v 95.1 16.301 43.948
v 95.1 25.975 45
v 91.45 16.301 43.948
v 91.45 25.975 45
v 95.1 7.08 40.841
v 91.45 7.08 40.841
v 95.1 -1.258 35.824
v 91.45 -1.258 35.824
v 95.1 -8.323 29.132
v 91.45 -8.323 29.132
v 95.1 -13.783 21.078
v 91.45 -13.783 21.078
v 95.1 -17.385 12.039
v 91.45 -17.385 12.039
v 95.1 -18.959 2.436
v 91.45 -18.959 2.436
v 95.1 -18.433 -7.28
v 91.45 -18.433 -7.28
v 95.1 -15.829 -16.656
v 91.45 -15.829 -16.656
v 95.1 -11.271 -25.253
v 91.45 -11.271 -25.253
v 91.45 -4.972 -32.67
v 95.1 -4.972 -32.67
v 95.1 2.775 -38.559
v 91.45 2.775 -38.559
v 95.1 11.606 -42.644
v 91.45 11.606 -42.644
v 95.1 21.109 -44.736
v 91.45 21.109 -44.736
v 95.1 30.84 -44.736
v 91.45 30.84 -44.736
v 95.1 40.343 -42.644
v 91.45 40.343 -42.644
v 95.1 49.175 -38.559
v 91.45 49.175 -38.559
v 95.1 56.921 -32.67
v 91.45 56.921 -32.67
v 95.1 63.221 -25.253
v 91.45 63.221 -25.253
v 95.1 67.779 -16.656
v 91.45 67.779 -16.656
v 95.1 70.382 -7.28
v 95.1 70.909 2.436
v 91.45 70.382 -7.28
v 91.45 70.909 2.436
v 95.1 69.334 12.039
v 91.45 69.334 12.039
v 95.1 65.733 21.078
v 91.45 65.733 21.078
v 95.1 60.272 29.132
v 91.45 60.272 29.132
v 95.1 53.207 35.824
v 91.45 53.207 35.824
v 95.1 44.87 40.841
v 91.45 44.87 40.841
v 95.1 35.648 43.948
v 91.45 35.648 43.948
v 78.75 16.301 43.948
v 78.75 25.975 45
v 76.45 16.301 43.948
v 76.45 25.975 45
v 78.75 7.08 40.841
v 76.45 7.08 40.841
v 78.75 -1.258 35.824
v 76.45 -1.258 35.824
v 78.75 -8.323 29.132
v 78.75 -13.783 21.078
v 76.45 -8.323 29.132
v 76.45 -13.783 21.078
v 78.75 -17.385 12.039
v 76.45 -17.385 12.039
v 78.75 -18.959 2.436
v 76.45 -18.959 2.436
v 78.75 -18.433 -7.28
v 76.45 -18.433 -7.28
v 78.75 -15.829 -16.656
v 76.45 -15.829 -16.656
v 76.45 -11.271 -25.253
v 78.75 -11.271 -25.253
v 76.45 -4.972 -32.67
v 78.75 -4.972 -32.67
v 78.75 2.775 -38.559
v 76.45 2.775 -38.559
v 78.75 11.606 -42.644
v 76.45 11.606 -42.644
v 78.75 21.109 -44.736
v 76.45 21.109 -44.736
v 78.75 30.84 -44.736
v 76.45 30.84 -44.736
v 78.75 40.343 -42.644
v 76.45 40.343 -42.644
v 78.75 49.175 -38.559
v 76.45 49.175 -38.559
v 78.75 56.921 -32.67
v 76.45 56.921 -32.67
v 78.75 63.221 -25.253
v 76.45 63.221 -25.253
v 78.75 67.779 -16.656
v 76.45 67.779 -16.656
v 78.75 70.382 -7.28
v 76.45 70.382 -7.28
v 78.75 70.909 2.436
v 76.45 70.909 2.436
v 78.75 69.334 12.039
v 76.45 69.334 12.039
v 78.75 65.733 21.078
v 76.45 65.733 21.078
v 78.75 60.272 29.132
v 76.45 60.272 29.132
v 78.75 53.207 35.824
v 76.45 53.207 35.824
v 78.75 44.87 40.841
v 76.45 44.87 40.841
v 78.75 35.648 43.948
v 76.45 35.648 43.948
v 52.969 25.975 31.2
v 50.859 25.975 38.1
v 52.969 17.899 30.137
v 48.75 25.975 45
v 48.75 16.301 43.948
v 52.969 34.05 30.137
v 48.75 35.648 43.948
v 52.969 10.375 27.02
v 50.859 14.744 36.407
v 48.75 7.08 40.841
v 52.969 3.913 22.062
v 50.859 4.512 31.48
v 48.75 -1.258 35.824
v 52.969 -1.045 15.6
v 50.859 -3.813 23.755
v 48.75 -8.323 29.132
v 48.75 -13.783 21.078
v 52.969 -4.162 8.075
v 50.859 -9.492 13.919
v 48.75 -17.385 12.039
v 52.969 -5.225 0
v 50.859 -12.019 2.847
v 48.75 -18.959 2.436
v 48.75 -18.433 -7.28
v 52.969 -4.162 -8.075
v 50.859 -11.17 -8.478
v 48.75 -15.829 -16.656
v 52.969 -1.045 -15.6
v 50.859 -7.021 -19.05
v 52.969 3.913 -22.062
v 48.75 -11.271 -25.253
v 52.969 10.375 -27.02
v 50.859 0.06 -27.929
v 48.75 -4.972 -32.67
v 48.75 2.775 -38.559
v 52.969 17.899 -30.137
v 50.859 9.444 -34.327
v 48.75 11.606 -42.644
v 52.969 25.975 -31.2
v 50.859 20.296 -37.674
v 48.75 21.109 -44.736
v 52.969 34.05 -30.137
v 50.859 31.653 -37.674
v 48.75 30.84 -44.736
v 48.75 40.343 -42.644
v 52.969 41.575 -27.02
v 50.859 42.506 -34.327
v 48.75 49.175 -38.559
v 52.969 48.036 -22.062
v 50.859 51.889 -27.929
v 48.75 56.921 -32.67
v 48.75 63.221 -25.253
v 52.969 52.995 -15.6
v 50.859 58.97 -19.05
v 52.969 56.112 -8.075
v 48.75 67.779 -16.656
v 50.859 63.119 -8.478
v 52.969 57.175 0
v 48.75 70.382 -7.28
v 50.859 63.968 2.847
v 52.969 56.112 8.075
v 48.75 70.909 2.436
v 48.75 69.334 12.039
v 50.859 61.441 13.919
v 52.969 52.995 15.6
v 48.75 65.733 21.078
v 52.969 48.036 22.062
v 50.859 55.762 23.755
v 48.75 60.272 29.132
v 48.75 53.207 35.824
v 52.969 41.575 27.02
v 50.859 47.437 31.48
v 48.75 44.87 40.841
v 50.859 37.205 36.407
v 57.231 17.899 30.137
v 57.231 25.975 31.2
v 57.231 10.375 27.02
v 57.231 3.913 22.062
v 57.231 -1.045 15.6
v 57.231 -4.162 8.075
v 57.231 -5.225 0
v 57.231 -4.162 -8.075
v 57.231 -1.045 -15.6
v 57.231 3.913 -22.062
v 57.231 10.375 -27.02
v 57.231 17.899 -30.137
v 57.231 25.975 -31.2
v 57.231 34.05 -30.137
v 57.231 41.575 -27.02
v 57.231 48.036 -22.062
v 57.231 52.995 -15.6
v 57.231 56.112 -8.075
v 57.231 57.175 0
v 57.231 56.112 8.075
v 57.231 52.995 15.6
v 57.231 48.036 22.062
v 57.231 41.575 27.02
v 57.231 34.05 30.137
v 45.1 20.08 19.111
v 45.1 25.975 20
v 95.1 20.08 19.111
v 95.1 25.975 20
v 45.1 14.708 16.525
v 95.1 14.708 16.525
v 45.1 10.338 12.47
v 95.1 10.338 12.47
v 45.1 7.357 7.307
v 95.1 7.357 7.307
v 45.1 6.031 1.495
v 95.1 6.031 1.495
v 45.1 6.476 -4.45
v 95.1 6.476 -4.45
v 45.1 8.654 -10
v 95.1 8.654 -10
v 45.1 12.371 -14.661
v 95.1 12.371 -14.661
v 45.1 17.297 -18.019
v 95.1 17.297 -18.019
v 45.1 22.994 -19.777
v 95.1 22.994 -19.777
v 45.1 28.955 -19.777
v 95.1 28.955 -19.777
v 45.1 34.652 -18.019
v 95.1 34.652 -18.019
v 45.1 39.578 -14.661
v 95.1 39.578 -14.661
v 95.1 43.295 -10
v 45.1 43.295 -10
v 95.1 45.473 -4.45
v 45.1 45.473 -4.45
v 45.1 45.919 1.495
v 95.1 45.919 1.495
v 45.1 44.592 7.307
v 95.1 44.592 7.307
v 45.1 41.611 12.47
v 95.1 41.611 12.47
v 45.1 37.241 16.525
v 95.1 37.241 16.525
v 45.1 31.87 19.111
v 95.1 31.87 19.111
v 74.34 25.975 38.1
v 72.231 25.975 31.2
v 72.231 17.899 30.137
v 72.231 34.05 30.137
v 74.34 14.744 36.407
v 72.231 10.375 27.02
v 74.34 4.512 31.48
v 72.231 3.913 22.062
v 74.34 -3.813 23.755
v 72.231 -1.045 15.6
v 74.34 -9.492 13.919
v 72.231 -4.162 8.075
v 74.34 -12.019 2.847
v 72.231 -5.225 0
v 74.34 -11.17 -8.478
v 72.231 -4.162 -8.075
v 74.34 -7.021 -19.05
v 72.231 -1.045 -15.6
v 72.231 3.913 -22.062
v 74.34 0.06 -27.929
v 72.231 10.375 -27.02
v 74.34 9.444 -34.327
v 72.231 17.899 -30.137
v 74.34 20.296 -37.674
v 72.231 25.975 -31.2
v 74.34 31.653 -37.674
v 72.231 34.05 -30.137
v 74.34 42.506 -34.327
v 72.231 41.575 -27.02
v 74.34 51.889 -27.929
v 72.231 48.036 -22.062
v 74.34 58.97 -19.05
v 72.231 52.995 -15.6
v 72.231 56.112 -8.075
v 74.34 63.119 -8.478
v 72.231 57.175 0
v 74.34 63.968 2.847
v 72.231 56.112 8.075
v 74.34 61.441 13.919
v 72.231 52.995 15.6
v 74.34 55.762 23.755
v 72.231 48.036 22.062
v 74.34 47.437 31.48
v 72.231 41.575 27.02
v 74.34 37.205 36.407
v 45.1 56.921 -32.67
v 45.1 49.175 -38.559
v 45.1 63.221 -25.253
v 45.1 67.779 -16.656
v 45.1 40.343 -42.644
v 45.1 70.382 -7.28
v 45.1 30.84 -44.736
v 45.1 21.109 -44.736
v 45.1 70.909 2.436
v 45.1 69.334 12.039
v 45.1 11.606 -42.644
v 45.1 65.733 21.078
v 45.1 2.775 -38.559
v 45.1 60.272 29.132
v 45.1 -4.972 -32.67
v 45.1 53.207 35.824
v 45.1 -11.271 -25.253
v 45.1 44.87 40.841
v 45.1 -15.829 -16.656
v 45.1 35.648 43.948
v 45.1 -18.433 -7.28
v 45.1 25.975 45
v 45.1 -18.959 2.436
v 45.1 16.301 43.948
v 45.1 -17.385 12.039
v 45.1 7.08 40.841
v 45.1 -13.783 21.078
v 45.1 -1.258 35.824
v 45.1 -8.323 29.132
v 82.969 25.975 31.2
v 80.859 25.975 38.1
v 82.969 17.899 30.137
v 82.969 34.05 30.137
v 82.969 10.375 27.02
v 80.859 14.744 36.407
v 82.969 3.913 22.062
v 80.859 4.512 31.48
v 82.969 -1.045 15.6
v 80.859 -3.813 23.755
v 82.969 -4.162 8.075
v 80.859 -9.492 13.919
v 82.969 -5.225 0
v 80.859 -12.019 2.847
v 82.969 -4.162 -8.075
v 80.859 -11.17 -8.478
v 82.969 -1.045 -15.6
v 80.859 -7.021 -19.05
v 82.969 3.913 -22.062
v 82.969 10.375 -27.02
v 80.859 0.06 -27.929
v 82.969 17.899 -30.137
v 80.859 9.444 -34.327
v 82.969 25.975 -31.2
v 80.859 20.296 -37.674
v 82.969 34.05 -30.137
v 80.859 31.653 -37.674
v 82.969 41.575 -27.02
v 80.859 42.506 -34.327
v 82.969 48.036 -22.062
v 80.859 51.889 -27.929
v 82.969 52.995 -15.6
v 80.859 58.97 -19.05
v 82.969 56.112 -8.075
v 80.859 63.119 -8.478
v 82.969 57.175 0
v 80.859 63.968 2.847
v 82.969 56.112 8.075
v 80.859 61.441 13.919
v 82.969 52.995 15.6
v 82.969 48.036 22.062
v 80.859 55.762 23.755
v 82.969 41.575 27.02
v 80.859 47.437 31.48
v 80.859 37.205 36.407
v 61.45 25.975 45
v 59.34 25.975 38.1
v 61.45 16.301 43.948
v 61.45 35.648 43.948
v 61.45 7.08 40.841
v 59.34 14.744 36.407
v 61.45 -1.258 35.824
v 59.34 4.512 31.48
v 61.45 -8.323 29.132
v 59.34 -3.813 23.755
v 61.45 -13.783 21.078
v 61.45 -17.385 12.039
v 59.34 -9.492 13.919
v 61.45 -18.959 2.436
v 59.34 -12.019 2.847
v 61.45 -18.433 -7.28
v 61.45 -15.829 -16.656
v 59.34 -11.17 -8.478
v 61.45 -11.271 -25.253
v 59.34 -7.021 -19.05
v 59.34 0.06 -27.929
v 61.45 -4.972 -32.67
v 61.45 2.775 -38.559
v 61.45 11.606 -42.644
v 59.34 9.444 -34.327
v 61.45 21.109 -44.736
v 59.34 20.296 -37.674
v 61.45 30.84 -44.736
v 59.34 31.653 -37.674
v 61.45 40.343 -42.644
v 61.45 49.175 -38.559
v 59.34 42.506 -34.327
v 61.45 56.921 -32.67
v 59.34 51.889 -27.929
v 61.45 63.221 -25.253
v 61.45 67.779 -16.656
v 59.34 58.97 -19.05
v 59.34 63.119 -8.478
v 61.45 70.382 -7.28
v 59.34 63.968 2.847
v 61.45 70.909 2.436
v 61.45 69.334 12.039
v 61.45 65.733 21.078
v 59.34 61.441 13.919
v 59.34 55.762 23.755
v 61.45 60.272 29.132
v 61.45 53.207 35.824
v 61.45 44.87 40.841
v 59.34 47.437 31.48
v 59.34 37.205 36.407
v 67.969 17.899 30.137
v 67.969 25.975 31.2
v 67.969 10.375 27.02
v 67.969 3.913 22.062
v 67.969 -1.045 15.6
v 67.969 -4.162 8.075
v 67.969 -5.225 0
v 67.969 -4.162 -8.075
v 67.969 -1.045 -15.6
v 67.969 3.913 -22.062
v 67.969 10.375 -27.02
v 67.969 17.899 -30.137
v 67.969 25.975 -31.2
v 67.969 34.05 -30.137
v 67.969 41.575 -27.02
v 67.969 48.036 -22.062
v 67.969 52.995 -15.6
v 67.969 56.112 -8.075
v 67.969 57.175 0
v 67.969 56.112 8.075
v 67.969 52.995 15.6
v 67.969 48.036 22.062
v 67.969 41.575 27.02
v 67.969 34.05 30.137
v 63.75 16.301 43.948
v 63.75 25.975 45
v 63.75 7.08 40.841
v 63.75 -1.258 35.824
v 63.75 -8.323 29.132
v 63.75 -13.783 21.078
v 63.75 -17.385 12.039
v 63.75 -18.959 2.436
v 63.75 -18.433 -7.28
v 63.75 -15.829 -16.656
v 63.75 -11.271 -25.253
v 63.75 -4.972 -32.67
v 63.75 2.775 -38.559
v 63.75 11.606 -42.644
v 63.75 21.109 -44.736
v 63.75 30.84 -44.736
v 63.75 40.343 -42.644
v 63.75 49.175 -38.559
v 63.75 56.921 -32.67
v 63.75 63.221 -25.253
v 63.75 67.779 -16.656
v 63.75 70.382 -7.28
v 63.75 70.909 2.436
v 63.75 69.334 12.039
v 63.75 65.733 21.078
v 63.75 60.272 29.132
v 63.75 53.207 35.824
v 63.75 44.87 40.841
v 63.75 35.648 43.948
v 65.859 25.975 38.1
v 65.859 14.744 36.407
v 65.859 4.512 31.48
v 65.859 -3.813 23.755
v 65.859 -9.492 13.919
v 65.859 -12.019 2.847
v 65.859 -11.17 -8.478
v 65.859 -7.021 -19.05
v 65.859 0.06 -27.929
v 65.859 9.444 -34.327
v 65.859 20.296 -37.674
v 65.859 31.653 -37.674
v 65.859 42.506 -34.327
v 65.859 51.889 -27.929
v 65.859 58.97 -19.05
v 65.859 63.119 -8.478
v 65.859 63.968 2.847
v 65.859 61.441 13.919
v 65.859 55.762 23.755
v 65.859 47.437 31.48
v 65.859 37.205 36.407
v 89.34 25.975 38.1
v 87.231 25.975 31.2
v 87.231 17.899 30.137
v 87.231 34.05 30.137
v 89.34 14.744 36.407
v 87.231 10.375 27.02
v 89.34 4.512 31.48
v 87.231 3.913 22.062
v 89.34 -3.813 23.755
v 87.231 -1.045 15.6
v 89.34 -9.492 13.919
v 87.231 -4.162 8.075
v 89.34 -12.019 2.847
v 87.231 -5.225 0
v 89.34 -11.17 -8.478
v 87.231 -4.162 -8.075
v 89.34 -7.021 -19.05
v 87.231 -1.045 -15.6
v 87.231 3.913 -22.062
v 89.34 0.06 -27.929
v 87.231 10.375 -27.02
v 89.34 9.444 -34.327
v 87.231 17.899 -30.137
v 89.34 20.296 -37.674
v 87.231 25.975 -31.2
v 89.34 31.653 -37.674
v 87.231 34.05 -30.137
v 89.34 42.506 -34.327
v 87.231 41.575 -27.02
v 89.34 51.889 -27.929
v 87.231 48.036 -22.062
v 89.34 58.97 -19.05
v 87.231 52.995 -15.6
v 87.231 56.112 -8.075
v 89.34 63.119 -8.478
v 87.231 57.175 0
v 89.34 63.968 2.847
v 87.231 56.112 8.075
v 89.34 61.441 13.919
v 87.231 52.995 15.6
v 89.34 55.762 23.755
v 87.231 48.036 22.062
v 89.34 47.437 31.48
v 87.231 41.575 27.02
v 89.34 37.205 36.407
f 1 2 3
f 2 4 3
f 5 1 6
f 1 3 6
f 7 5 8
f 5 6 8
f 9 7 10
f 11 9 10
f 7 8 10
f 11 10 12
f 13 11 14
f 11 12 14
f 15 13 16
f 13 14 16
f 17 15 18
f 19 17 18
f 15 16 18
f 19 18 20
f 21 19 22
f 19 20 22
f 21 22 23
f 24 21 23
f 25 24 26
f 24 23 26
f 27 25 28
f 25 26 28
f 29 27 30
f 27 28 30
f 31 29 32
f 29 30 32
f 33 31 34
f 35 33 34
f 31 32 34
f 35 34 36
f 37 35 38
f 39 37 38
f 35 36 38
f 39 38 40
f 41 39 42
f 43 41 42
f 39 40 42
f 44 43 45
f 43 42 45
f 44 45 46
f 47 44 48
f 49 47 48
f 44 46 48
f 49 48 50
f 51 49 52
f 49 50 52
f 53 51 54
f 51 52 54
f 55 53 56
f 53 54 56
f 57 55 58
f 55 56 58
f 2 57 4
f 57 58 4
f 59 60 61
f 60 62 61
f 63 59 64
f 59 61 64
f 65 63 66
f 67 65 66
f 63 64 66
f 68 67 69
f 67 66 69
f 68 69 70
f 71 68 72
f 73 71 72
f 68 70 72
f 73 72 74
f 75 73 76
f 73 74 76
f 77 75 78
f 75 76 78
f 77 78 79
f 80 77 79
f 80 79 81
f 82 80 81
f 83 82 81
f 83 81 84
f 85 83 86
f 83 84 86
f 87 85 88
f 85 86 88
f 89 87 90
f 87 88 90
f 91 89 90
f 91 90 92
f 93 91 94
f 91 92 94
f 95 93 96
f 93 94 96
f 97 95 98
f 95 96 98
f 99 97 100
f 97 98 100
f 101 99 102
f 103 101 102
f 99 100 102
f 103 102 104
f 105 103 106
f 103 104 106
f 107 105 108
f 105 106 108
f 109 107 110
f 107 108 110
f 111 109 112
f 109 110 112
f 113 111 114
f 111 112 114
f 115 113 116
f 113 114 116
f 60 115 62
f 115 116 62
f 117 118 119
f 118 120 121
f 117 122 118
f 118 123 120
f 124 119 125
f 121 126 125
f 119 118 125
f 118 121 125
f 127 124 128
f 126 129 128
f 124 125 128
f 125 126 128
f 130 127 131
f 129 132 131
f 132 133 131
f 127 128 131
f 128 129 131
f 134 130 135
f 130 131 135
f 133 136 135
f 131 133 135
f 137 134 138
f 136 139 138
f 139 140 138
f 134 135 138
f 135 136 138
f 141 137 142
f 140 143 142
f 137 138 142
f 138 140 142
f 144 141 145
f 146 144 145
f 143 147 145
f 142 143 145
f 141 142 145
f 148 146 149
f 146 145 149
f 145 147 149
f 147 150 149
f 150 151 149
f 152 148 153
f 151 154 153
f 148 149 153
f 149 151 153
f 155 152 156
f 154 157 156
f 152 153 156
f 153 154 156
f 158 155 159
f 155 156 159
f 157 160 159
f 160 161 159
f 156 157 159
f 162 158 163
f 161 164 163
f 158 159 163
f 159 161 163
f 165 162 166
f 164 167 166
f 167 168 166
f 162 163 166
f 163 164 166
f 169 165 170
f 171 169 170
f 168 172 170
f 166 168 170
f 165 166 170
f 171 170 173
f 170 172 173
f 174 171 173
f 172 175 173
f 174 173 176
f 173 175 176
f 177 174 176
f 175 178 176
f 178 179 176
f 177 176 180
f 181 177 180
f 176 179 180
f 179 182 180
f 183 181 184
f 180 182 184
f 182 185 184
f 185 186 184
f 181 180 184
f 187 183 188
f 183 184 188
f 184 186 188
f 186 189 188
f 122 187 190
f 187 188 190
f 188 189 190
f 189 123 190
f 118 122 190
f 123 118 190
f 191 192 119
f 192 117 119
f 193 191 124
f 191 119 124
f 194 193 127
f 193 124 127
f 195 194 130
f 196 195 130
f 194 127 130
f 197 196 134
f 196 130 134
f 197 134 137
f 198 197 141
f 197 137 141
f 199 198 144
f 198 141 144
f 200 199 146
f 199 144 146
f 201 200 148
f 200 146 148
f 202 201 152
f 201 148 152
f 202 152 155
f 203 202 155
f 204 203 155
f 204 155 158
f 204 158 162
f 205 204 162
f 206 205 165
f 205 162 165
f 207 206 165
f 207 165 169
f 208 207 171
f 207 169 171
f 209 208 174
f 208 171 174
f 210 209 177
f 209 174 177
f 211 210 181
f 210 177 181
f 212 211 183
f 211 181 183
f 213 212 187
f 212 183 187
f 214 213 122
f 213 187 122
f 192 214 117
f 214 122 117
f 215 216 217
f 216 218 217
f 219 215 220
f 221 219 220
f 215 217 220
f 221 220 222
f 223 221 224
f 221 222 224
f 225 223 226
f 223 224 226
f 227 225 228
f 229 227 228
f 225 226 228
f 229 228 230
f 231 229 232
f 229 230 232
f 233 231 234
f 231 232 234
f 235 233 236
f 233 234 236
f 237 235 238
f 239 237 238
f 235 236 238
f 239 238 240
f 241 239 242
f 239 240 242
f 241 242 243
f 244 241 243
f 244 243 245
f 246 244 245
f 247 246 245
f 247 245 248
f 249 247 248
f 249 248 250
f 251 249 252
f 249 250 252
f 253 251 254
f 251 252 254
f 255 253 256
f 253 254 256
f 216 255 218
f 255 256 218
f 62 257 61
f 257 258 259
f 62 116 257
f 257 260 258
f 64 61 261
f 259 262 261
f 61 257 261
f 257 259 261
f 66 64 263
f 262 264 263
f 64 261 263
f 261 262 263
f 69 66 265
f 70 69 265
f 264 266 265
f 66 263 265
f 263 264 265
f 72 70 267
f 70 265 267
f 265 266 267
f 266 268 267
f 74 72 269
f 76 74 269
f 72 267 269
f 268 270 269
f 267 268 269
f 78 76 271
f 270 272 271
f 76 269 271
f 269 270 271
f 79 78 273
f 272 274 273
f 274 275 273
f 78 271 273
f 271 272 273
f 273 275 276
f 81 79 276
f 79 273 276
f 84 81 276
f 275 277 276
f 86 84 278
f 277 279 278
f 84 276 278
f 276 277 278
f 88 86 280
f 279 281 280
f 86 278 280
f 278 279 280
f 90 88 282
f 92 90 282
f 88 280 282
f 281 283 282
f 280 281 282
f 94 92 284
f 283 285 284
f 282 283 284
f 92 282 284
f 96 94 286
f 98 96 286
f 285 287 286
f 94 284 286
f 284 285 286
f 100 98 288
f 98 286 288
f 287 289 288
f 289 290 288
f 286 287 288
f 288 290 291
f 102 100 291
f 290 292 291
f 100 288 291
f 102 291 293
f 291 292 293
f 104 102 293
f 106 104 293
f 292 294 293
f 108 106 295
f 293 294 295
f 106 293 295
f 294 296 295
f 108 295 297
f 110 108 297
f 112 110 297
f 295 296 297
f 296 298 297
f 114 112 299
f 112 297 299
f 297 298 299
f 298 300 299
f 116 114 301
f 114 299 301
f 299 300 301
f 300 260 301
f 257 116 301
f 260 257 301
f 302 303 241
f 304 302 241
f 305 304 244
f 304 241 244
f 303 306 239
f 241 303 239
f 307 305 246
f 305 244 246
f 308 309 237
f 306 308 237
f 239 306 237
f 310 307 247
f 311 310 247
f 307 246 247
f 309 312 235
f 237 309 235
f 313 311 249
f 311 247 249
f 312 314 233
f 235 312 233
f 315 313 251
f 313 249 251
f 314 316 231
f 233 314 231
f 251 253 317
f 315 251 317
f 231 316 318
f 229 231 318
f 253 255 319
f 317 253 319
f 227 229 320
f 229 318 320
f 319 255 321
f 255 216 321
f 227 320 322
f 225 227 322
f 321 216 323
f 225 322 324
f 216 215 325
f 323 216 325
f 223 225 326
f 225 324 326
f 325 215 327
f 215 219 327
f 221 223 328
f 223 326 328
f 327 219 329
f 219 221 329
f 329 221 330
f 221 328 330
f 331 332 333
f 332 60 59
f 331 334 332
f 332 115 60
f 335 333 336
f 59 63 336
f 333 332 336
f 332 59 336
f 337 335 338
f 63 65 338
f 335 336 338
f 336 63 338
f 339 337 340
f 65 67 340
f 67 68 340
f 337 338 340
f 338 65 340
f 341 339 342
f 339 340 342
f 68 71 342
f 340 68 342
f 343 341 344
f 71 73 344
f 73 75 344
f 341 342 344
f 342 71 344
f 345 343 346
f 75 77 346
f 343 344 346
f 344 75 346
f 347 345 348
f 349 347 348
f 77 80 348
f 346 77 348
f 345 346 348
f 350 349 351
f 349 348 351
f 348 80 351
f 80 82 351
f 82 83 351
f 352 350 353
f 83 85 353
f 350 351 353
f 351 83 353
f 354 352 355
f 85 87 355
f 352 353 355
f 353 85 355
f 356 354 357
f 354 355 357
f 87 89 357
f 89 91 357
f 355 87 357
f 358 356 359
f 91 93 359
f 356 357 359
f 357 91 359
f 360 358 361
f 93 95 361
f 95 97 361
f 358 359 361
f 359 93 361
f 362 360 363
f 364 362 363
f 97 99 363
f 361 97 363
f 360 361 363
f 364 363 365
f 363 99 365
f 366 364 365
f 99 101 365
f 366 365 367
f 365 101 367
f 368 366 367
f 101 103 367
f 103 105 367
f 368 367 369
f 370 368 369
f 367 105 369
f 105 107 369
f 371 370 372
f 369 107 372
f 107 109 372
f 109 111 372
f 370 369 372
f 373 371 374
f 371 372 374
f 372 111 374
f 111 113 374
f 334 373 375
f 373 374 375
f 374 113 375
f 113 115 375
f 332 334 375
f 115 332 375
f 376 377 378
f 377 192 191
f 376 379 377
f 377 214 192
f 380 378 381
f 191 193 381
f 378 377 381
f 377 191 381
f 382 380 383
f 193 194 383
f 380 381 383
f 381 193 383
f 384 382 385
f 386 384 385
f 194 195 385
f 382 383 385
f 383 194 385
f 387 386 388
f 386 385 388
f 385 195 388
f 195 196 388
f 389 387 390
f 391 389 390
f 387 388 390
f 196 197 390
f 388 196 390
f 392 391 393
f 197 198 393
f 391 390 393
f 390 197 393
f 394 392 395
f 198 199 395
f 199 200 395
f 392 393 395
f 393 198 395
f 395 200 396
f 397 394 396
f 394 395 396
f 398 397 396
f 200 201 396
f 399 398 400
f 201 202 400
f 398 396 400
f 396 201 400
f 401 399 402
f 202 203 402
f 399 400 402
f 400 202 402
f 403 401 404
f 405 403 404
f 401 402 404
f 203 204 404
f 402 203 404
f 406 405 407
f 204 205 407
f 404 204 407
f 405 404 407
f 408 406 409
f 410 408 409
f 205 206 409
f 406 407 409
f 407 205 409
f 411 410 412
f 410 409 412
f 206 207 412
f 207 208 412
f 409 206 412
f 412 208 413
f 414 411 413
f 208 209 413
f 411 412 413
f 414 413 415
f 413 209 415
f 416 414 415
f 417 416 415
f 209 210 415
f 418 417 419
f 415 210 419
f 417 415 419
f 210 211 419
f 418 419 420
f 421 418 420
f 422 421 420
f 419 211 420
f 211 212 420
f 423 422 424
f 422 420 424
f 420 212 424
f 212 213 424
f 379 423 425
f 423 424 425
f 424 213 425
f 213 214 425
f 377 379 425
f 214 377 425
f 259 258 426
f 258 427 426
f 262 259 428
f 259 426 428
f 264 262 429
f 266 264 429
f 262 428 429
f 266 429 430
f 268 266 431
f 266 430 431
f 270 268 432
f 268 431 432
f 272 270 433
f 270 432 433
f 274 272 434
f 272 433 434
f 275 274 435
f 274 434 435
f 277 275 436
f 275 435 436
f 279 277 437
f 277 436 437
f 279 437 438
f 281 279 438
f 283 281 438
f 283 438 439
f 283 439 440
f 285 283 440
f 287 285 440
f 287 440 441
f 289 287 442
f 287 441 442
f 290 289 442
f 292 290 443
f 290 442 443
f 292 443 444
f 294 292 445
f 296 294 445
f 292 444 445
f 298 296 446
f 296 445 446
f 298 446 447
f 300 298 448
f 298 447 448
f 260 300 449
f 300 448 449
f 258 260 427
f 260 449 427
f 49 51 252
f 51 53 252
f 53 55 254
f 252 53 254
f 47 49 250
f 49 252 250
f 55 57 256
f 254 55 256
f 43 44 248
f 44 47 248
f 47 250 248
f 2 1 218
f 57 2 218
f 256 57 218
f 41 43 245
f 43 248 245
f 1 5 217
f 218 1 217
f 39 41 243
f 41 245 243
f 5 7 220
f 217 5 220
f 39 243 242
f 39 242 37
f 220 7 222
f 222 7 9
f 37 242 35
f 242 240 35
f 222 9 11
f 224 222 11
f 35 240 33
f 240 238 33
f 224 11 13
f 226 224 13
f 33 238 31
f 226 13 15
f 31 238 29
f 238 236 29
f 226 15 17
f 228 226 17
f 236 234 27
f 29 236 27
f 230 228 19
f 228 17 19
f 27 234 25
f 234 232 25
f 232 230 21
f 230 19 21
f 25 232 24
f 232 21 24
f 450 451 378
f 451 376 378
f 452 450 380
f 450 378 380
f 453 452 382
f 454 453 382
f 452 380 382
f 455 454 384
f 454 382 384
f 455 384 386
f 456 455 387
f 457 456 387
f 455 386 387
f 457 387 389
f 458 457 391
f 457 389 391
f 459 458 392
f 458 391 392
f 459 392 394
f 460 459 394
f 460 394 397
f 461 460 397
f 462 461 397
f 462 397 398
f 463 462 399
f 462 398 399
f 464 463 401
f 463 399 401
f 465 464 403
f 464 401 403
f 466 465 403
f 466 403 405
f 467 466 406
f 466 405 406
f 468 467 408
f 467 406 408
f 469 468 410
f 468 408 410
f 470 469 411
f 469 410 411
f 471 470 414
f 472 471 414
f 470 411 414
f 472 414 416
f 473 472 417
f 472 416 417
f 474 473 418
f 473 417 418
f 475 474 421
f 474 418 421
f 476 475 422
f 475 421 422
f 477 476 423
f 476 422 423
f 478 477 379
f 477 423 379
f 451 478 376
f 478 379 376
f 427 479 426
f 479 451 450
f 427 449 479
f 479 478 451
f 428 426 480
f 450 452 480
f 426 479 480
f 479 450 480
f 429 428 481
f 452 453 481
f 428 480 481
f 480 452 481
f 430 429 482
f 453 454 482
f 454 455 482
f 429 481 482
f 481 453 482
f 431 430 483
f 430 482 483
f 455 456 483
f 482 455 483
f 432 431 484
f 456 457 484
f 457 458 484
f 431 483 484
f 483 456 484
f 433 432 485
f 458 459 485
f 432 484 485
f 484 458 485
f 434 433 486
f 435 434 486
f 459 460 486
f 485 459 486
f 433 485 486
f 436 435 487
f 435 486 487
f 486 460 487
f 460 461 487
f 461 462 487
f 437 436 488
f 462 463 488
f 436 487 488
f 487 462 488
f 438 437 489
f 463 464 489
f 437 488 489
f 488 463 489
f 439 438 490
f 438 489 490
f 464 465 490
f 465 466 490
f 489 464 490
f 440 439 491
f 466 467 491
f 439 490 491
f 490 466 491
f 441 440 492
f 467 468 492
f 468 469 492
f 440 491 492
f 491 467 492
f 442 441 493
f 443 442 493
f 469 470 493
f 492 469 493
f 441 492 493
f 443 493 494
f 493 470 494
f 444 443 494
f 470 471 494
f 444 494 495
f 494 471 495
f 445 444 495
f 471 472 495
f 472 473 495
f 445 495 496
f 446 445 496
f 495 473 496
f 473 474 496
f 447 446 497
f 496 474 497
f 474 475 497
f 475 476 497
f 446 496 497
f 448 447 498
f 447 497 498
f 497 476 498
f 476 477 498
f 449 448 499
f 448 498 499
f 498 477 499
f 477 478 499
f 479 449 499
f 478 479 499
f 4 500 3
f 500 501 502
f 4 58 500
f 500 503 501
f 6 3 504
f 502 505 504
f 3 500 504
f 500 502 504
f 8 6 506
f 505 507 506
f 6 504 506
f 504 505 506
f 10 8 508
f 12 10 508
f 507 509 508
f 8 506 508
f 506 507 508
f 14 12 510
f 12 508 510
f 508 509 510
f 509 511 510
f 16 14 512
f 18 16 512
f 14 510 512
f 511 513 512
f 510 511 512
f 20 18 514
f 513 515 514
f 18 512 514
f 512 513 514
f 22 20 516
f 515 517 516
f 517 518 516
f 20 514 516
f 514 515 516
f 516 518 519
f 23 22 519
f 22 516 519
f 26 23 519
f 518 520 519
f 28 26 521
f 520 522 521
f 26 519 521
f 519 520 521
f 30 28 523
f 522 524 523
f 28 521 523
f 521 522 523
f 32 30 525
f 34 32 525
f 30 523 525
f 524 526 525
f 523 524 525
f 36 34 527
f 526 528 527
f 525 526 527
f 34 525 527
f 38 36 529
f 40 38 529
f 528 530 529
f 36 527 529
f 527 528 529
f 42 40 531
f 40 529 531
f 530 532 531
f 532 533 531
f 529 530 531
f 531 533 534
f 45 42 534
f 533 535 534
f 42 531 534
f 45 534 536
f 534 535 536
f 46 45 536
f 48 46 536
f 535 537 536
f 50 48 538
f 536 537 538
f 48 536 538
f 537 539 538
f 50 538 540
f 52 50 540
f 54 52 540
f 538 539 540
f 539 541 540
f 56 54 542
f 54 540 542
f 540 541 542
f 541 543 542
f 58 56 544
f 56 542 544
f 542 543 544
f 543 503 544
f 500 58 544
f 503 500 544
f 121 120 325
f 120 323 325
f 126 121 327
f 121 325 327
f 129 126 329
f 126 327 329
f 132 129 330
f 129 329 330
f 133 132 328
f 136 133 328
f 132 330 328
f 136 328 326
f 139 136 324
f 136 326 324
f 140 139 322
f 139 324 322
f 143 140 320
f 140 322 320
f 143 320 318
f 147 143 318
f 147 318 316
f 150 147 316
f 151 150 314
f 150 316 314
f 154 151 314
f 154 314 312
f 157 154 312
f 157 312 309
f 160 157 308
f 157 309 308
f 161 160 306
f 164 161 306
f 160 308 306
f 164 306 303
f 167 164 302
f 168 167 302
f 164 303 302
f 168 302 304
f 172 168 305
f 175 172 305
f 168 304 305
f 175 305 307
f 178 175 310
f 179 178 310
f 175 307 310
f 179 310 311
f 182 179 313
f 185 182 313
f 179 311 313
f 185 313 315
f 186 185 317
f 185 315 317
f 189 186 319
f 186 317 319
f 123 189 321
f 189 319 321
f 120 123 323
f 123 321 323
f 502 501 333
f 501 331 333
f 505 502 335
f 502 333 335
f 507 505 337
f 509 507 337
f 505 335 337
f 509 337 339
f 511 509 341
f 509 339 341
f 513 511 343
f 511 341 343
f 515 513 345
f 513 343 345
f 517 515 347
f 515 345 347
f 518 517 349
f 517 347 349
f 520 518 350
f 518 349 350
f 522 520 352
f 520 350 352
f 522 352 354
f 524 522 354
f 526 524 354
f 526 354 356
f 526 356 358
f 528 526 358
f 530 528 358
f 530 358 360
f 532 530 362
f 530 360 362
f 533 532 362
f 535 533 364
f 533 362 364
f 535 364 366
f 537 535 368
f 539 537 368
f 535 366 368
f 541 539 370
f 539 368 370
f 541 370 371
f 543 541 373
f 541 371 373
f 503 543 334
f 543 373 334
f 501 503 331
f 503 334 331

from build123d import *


with BuildPart() as part:
    # Skizze1 → Rotation2 (revolve)
    with BuildSketch(Plane.XY, mode=Mode.PRIVATE) as rotation2_sk:
        Polygon((45.099637471, 45.974649946), (95.099637471, 45.974649946), (95.099637471, 70.974649946), (91.449637471, 70.974649946), (87.230554067, 57.174649946), (82.968720876, 57.174649946), (78.749637471, 70.974649946), (76.449637471, 70.974649946), (72.230554067, 57.174649946), (70.099637471, 57.174649946), (67.968720876, 57.174649946), (63.749637471, 70.974649946), (61.449637471, 70.974649946), (57.230554067, 57.174649946), (52.968720876, 57.174649946), (48.749637471, 70.974649946), (45.099637471, 70.974649946), align=None)
    revolve(rotation2_sk.sketch.rotate(Axis((24.821753872, 25.974649946, 0), (1, 0, 0)), 90), axis=Axis((24.821753872, 25.974649946, 0), (1, 0, 0)))  # turned: the seam where the file's is


solid = part.part
